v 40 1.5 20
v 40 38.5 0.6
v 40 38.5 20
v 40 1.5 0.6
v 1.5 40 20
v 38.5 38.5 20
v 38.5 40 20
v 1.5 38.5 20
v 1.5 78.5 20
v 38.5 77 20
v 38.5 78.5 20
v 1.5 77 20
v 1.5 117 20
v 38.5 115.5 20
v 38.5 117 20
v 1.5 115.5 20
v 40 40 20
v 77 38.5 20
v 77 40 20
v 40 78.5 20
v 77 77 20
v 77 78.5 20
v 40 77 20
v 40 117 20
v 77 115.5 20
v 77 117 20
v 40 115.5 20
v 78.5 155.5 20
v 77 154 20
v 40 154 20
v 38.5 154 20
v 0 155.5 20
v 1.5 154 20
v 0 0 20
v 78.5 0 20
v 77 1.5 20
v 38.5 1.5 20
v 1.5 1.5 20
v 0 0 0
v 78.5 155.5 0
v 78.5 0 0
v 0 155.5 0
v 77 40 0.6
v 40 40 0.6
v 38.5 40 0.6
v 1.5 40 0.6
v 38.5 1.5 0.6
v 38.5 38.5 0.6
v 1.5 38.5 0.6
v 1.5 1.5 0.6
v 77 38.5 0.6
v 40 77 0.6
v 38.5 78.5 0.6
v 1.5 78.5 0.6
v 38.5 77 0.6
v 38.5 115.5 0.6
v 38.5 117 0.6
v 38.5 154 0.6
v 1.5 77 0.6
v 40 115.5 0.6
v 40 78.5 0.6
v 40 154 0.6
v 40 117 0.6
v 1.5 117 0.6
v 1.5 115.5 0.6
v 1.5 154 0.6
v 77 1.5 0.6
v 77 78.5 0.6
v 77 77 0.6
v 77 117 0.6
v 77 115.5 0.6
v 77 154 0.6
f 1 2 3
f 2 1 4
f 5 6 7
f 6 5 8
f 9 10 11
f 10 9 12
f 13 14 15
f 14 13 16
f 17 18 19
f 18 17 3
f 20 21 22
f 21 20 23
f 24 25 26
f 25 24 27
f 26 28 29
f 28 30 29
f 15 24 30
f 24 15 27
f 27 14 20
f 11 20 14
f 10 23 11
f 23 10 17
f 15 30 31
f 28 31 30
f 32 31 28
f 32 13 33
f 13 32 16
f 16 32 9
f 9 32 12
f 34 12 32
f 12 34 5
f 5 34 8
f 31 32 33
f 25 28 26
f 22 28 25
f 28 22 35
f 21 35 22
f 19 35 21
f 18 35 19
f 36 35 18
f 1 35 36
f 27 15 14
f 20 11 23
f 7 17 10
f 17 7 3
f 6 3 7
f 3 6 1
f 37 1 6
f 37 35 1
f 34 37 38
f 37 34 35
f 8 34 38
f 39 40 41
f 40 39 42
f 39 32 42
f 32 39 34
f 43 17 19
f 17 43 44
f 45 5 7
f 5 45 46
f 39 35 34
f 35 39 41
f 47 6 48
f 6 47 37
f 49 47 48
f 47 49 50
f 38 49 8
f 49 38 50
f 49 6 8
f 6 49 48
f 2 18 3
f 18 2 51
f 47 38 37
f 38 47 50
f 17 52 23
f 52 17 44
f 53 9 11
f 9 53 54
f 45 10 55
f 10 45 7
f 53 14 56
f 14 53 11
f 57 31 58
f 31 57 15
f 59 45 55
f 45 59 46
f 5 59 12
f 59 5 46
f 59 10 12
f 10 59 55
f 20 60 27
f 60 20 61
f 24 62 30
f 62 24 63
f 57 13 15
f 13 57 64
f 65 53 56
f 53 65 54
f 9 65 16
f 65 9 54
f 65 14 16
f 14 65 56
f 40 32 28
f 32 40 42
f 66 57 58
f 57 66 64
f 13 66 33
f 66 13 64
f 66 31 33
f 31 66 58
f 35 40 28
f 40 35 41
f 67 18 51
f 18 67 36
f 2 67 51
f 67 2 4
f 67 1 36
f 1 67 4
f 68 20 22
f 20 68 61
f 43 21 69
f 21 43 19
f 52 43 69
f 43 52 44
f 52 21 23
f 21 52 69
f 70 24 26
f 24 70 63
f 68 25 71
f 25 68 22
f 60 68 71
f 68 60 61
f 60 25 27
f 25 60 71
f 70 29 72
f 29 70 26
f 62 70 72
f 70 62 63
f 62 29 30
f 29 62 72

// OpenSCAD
wall=1.5;

n_x = 2;
n_y = 4;

module base_box(w_x,w_y,h) {
    difference() {
        cube([w_x,w_y,h]);
        translate([wall,wall,.6]) cube([w_x-wall*2,w_y-wall*2,h]);
    }
}

for (x=[0:n_x-1],y=[0:n_y-1]) {
    t_x = 40*x-x*wall;
    t_y = 40*y-y*wall;
    echo(t_x,t_y);
    translate([t_x,t_y,0]) base_box(40,40,20);
}
